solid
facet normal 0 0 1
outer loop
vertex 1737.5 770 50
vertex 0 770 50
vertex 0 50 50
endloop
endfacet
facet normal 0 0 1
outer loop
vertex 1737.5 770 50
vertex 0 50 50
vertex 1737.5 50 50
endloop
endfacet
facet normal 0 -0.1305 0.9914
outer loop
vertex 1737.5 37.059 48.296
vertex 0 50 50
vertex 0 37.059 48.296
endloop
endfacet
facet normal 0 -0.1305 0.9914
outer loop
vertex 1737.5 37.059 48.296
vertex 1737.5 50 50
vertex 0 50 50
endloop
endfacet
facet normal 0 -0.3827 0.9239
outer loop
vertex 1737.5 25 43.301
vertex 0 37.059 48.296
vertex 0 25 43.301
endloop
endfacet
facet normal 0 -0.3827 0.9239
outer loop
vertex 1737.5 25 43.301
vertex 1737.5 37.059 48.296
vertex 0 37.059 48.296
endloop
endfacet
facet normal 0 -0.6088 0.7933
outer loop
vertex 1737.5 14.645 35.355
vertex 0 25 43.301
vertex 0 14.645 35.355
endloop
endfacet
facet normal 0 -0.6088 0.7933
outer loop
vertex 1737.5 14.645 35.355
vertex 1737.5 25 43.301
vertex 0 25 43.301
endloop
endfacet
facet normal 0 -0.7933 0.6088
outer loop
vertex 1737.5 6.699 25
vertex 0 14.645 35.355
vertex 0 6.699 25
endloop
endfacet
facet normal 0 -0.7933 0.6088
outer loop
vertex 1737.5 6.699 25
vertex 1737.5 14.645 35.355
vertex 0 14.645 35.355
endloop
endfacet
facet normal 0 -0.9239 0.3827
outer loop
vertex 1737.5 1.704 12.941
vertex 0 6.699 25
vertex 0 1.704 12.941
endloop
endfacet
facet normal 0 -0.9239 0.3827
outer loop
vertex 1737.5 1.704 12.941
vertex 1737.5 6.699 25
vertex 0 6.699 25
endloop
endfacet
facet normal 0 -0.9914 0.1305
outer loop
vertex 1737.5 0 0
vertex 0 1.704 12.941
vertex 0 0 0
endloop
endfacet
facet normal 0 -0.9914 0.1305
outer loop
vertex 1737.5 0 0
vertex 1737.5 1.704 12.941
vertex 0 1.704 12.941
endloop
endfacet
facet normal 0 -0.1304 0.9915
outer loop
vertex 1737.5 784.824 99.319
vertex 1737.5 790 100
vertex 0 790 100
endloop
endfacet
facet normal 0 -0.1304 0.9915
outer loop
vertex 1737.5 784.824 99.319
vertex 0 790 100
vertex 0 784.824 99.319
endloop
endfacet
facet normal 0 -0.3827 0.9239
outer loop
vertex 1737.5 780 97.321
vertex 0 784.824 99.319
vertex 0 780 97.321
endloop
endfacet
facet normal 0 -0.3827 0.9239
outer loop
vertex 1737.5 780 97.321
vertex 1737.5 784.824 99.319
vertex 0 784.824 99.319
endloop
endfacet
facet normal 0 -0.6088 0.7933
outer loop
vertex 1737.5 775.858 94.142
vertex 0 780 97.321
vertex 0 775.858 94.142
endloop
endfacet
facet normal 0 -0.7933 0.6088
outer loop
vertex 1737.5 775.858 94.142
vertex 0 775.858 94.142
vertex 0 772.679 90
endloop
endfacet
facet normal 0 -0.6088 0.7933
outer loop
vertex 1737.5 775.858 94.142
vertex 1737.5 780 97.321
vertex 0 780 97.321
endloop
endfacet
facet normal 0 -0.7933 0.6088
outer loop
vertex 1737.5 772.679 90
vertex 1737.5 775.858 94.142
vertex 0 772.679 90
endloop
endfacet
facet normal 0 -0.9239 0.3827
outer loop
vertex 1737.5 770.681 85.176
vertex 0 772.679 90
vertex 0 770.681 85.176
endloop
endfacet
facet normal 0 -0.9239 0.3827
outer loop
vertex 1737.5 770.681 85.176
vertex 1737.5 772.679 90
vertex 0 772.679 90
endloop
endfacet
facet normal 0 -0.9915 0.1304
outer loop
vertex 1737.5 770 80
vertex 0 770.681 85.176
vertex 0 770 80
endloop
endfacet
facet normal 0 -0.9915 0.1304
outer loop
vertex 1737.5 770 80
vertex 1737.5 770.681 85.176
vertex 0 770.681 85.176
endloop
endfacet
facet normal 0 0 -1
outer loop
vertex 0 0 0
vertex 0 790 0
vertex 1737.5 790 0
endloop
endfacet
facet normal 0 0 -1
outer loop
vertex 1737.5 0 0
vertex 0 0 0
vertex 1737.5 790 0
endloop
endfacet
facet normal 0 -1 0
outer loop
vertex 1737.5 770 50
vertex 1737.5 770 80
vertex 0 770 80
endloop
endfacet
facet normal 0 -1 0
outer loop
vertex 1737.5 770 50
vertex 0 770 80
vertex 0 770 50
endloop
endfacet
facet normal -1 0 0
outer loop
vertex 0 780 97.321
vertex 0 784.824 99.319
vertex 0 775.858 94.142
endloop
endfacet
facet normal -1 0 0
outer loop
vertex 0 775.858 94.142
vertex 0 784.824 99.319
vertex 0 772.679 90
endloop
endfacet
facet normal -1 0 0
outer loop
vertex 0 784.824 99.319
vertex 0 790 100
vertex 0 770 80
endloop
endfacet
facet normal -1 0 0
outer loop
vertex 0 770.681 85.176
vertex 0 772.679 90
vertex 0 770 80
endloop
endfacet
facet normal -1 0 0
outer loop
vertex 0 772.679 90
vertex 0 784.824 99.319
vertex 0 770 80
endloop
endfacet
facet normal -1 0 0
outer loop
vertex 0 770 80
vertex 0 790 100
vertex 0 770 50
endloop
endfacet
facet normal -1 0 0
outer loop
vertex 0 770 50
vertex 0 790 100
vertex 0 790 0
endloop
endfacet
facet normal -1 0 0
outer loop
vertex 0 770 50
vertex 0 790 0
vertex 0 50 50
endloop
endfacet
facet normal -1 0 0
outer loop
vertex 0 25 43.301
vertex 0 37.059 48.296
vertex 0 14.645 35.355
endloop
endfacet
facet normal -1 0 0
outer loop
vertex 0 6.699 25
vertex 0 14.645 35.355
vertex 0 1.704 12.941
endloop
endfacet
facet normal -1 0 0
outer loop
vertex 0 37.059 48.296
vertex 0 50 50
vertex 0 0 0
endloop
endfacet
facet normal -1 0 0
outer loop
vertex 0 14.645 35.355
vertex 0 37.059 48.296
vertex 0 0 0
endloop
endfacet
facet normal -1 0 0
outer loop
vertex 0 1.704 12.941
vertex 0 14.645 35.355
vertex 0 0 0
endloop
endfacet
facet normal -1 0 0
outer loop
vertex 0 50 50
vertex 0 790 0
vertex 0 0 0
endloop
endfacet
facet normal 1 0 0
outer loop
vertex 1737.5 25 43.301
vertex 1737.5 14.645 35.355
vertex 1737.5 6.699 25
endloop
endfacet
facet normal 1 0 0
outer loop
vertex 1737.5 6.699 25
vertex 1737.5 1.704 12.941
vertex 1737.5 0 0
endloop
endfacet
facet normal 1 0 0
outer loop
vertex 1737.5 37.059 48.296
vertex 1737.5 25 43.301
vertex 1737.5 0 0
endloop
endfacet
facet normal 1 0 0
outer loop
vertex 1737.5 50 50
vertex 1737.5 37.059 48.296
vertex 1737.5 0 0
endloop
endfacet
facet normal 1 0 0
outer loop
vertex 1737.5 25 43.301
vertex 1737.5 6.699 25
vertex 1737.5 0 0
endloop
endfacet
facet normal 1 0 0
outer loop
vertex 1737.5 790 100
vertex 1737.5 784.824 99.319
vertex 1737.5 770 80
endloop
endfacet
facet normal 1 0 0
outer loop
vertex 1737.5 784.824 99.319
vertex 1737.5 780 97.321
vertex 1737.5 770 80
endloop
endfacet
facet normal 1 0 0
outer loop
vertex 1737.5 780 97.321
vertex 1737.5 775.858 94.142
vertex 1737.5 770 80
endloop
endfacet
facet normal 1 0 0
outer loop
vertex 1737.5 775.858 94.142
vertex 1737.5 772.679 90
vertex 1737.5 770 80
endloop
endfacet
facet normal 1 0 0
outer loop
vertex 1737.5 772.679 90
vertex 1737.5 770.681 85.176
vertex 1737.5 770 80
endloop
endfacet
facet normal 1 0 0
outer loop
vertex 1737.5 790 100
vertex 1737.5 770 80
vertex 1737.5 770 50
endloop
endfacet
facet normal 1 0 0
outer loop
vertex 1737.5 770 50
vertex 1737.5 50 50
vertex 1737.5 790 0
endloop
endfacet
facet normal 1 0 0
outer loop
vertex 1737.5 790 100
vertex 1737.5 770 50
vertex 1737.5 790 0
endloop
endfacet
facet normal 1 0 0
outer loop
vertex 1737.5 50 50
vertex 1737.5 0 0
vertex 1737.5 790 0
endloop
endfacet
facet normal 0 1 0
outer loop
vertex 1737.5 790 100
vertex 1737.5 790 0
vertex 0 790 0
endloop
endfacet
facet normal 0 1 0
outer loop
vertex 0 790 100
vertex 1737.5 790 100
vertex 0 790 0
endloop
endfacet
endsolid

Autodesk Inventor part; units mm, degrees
ref_plane "YZ Plane" through (0, 0, 0) normal (1, 0, 0) x (0, 1, 0)
ref_plane "XZ Plane" through (0, 0, 0) normal (0, 1, 0) x (-1, 0, 0)
ref_plane "XY Plane" through (0, 0, 0) normal (0, 0, 1) x (1, 0, 0)
sketch "Sketch1" plane through (0, 0, 0) normal (0, 0, 1) x (1, 0, 0)
  line L0 (0, 0) -> (1737.5, 0)
  line L1 (1737.5, 0) -> (1737.5, 790)
  line L2 (1737.5, 790) -> (0, 790)
  line L3 (0, 790) -> (0, 0)
  dimension "ancho" = 1737.5
  dimension "d1" = 790
extrude "Extrusion1" add sketch "Sketch1" along normal blind 50
fillet "Fillet1" radius 50 1 edges at (868.75, 0, 50)
sketch "Sketch2" plane through (1737.5, 790, 50) normal (1, 0, 0) x (0, 0, -1)
  line L0 (50, 0) -> (-50, 0)
  line L1 (-50, 0) -> (-50, 0)
  line L2 (-30, -20) -> (50, -20)
  line L3 (50, -20) -> (50, 0)
  arc A0 (-50, 0) -> (-30, -20) centre (-30, 0) ccw
  point P0 (50, -790)
  point P1 (-50, -20)
  dimension "d5" = 100
  dimension "d6" = 20
  dimension "d7" = 20
extrude "Extrusion2" add sketch "Sketch2" against normal up to surface (1737.5 mm away)
properties part number "meson"
